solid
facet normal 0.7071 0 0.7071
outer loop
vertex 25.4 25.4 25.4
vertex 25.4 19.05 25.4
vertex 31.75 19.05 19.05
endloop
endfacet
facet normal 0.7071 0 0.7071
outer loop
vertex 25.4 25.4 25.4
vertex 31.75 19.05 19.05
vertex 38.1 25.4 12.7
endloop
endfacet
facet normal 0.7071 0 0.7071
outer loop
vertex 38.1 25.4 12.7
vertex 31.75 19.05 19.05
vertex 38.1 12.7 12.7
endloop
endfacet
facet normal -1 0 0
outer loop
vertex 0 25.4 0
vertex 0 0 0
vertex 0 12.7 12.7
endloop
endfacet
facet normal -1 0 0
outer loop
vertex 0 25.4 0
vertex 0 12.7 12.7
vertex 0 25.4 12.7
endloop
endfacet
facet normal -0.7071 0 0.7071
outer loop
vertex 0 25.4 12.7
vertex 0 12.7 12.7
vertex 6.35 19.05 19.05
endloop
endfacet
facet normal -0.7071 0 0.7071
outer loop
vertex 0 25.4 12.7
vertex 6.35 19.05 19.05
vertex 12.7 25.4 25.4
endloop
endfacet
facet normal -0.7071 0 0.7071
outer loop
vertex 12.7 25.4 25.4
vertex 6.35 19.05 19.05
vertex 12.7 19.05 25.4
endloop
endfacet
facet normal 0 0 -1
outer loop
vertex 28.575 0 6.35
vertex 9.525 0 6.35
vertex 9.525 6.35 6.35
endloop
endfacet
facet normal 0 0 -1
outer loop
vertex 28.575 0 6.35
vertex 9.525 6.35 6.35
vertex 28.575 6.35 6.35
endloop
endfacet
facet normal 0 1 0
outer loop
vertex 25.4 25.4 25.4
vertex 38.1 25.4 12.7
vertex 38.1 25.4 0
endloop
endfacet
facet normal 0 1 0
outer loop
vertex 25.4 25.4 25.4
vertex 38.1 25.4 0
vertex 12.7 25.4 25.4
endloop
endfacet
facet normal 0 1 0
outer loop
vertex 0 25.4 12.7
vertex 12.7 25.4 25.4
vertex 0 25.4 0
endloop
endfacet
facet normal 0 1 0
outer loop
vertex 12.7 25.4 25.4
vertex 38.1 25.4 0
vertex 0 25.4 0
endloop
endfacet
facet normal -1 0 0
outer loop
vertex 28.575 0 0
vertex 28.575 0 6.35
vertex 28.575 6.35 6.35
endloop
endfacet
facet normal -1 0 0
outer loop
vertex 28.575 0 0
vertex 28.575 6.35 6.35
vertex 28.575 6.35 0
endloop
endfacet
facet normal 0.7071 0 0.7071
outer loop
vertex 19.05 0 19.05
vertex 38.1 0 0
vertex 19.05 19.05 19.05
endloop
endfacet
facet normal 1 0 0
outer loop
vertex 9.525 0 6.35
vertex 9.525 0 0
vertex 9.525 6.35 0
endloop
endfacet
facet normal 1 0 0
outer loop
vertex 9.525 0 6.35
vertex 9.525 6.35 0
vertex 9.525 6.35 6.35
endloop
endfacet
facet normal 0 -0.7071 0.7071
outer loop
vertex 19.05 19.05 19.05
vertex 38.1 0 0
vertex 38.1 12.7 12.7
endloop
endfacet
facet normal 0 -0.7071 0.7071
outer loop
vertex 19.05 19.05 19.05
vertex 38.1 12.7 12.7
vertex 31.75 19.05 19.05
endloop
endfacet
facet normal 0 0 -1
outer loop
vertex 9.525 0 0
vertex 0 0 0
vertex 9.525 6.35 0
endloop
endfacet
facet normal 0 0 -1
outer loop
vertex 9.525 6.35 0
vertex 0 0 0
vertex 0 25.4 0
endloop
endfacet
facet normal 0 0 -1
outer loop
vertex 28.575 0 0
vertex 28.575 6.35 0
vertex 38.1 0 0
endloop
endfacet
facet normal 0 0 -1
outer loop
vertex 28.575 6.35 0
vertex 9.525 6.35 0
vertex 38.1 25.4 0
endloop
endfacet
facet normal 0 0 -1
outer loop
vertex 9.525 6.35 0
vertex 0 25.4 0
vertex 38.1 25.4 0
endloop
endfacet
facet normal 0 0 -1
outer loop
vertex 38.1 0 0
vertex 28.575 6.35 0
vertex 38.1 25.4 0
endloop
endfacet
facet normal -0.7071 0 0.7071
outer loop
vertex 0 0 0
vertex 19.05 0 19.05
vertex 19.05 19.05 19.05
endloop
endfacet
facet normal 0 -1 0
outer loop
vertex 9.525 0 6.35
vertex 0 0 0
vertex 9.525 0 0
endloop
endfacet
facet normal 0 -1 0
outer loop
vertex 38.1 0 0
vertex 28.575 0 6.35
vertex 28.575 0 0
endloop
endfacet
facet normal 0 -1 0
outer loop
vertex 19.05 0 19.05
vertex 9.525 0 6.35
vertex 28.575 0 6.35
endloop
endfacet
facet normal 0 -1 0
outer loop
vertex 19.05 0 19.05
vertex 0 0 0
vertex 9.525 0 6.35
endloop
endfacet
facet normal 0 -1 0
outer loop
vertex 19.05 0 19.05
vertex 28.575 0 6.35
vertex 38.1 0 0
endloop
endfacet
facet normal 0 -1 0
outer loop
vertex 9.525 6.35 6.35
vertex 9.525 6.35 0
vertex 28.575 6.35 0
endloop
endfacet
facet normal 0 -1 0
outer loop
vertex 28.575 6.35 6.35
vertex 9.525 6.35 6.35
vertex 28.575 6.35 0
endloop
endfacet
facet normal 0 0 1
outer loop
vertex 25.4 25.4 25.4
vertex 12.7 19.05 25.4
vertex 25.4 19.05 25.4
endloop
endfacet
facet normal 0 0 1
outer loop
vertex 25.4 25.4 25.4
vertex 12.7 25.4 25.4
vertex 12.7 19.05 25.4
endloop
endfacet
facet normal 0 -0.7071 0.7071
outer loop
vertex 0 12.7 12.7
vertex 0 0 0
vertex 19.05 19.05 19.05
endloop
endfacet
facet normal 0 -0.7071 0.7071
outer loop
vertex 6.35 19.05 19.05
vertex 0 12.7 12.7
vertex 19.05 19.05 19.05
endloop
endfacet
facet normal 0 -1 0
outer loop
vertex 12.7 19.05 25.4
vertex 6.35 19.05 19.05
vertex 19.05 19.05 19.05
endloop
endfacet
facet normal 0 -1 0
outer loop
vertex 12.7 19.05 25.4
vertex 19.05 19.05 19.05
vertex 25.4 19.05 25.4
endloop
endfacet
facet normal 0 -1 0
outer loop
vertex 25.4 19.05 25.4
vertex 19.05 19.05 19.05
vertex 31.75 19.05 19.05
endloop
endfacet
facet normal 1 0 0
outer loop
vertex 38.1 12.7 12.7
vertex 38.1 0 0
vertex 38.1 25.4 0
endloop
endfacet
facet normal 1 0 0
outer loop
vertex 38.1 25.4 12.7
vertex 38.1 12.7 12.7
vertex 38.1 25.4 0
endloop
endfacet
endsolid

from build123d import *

# Parameters (mm, degrees)
F0_W      = 12.7
F0_H      = 6.35
F1_DEPTH  = 25.4
F3_DEPTH  = 6.351
F4_DEPTH  = 19.05
F6_DEPTH  = 19.05
F7_DEPTH  = 25.4
F9_DEPTH  = 38.101
F10_DEPTH = 25.4
F12_DEPTH = 25.401


with BuildPart() as f1:
    # F0 (on Top) → F1 (new body)
    with BuildSketch(Plane.XY):
        Polygon((25.4, 25.4), (12.7, 25.4), (12.7, 19.05), (19.05, 19.05), (25.4, 19.05), align=None)
        with Locations((6.35, 22.225)):
            Rectangle(F0_W, F0_H)
        with Locations((31.75, 22.225)):
            Rectangle(F0_W, F0_H)
    extrude(amount=F1_DEPTH)

    # F2 (on face) → F3 (cut, through all)
    with BuildSketch(Plane.XZ.offset(-19.05)):
        Polygon((12.7, 25.4), (0, 25.4), (0, 12.7), align=None)
        Polygon((38.1, 25.4), (25.4, 25.4), (38.1, 12.7), align=None)
    extrude(amount=-F3_DEPTH, mode=Mode.SUBTRACT)



with BuildPart() as f4:
    # F0 (on Top) → F4 (new body)
    with BuildSketch(Plane.XY):
        Polygon((19.05, 19.05), (0, 0), (9.525, 0), (9.525, 6.35), (28.575, 6.35), (28.575, 0), (38.1, 0), align=None)
    extrude(amount=F4_DEPTH)

    # F5 (on face) → F6 (cut)
    with BuildSketch(Plane.XZ):
        Polygon((38.1, 19.05), (28.575, 19.05), (28.575, 9.525), (38.1, 0), align=None)
        Polygon((0, 19.05), (0, 0), (19.05, 19.05), align=None)
    extrude(amount=-F6_DEPTH, mode=Mode.SUBTRACT)


with BuildPart() as f1_1:
    add(f1.part)

    add(f4.part)  # F7 merges F4
    # F0 (on Top) → F7 (join)
    with BuildSketch(Plane.XY):
        Polygon((38.1, 19.05), (25.4, 19.05), (19.05, 19.05), (38.1, 0), align=None)
        Polygon((12.7, 19.05), (0, 19.05), (0, 0), (19.05, 19.05), align=None)
    extrude(amount=F7_DEPTH)

    # F8 (on face) → F9 (cut, through all)
    with BuildSketch(Plane.YZ.offset(38.1)):
        Polygon((0, 0), (19.05, 19.05), (19.05, 25.4), (0, 25.4), align=None)
    extrude(amount=-F9_DEPTH, mode=Mode.SUBTRACT)

    # F5 (on face) → F10 (join)
    with BuildSketch(Plane.XZ):
        Polygon((19.05, 19.05), (0, 0), (9.525, 0), (9.525, 6.35), (28.575, 6.35), (28.575, 9.525), align=None)
        Polygon((28.575, 6.35), (28.575, 0), (38.1, 0), (28.575, 9.525), align=None)
    extrude(amount=-F10_DEPTH)

    # F11 (on face) → F12 (cut, through all)
    with BuildSketch(Plane.XZ):
        Polygon((6.35, 19.05), (0, 19.05), (0, 12.7), align=None)
        Polygon((38.1, 12.7), (38.1, 19.05), (31.75, 19.05), align=None)
    extrude(amount=-F12_DEPTH, mode=Mode.SUBTRACT)


solid = f1_1.part
